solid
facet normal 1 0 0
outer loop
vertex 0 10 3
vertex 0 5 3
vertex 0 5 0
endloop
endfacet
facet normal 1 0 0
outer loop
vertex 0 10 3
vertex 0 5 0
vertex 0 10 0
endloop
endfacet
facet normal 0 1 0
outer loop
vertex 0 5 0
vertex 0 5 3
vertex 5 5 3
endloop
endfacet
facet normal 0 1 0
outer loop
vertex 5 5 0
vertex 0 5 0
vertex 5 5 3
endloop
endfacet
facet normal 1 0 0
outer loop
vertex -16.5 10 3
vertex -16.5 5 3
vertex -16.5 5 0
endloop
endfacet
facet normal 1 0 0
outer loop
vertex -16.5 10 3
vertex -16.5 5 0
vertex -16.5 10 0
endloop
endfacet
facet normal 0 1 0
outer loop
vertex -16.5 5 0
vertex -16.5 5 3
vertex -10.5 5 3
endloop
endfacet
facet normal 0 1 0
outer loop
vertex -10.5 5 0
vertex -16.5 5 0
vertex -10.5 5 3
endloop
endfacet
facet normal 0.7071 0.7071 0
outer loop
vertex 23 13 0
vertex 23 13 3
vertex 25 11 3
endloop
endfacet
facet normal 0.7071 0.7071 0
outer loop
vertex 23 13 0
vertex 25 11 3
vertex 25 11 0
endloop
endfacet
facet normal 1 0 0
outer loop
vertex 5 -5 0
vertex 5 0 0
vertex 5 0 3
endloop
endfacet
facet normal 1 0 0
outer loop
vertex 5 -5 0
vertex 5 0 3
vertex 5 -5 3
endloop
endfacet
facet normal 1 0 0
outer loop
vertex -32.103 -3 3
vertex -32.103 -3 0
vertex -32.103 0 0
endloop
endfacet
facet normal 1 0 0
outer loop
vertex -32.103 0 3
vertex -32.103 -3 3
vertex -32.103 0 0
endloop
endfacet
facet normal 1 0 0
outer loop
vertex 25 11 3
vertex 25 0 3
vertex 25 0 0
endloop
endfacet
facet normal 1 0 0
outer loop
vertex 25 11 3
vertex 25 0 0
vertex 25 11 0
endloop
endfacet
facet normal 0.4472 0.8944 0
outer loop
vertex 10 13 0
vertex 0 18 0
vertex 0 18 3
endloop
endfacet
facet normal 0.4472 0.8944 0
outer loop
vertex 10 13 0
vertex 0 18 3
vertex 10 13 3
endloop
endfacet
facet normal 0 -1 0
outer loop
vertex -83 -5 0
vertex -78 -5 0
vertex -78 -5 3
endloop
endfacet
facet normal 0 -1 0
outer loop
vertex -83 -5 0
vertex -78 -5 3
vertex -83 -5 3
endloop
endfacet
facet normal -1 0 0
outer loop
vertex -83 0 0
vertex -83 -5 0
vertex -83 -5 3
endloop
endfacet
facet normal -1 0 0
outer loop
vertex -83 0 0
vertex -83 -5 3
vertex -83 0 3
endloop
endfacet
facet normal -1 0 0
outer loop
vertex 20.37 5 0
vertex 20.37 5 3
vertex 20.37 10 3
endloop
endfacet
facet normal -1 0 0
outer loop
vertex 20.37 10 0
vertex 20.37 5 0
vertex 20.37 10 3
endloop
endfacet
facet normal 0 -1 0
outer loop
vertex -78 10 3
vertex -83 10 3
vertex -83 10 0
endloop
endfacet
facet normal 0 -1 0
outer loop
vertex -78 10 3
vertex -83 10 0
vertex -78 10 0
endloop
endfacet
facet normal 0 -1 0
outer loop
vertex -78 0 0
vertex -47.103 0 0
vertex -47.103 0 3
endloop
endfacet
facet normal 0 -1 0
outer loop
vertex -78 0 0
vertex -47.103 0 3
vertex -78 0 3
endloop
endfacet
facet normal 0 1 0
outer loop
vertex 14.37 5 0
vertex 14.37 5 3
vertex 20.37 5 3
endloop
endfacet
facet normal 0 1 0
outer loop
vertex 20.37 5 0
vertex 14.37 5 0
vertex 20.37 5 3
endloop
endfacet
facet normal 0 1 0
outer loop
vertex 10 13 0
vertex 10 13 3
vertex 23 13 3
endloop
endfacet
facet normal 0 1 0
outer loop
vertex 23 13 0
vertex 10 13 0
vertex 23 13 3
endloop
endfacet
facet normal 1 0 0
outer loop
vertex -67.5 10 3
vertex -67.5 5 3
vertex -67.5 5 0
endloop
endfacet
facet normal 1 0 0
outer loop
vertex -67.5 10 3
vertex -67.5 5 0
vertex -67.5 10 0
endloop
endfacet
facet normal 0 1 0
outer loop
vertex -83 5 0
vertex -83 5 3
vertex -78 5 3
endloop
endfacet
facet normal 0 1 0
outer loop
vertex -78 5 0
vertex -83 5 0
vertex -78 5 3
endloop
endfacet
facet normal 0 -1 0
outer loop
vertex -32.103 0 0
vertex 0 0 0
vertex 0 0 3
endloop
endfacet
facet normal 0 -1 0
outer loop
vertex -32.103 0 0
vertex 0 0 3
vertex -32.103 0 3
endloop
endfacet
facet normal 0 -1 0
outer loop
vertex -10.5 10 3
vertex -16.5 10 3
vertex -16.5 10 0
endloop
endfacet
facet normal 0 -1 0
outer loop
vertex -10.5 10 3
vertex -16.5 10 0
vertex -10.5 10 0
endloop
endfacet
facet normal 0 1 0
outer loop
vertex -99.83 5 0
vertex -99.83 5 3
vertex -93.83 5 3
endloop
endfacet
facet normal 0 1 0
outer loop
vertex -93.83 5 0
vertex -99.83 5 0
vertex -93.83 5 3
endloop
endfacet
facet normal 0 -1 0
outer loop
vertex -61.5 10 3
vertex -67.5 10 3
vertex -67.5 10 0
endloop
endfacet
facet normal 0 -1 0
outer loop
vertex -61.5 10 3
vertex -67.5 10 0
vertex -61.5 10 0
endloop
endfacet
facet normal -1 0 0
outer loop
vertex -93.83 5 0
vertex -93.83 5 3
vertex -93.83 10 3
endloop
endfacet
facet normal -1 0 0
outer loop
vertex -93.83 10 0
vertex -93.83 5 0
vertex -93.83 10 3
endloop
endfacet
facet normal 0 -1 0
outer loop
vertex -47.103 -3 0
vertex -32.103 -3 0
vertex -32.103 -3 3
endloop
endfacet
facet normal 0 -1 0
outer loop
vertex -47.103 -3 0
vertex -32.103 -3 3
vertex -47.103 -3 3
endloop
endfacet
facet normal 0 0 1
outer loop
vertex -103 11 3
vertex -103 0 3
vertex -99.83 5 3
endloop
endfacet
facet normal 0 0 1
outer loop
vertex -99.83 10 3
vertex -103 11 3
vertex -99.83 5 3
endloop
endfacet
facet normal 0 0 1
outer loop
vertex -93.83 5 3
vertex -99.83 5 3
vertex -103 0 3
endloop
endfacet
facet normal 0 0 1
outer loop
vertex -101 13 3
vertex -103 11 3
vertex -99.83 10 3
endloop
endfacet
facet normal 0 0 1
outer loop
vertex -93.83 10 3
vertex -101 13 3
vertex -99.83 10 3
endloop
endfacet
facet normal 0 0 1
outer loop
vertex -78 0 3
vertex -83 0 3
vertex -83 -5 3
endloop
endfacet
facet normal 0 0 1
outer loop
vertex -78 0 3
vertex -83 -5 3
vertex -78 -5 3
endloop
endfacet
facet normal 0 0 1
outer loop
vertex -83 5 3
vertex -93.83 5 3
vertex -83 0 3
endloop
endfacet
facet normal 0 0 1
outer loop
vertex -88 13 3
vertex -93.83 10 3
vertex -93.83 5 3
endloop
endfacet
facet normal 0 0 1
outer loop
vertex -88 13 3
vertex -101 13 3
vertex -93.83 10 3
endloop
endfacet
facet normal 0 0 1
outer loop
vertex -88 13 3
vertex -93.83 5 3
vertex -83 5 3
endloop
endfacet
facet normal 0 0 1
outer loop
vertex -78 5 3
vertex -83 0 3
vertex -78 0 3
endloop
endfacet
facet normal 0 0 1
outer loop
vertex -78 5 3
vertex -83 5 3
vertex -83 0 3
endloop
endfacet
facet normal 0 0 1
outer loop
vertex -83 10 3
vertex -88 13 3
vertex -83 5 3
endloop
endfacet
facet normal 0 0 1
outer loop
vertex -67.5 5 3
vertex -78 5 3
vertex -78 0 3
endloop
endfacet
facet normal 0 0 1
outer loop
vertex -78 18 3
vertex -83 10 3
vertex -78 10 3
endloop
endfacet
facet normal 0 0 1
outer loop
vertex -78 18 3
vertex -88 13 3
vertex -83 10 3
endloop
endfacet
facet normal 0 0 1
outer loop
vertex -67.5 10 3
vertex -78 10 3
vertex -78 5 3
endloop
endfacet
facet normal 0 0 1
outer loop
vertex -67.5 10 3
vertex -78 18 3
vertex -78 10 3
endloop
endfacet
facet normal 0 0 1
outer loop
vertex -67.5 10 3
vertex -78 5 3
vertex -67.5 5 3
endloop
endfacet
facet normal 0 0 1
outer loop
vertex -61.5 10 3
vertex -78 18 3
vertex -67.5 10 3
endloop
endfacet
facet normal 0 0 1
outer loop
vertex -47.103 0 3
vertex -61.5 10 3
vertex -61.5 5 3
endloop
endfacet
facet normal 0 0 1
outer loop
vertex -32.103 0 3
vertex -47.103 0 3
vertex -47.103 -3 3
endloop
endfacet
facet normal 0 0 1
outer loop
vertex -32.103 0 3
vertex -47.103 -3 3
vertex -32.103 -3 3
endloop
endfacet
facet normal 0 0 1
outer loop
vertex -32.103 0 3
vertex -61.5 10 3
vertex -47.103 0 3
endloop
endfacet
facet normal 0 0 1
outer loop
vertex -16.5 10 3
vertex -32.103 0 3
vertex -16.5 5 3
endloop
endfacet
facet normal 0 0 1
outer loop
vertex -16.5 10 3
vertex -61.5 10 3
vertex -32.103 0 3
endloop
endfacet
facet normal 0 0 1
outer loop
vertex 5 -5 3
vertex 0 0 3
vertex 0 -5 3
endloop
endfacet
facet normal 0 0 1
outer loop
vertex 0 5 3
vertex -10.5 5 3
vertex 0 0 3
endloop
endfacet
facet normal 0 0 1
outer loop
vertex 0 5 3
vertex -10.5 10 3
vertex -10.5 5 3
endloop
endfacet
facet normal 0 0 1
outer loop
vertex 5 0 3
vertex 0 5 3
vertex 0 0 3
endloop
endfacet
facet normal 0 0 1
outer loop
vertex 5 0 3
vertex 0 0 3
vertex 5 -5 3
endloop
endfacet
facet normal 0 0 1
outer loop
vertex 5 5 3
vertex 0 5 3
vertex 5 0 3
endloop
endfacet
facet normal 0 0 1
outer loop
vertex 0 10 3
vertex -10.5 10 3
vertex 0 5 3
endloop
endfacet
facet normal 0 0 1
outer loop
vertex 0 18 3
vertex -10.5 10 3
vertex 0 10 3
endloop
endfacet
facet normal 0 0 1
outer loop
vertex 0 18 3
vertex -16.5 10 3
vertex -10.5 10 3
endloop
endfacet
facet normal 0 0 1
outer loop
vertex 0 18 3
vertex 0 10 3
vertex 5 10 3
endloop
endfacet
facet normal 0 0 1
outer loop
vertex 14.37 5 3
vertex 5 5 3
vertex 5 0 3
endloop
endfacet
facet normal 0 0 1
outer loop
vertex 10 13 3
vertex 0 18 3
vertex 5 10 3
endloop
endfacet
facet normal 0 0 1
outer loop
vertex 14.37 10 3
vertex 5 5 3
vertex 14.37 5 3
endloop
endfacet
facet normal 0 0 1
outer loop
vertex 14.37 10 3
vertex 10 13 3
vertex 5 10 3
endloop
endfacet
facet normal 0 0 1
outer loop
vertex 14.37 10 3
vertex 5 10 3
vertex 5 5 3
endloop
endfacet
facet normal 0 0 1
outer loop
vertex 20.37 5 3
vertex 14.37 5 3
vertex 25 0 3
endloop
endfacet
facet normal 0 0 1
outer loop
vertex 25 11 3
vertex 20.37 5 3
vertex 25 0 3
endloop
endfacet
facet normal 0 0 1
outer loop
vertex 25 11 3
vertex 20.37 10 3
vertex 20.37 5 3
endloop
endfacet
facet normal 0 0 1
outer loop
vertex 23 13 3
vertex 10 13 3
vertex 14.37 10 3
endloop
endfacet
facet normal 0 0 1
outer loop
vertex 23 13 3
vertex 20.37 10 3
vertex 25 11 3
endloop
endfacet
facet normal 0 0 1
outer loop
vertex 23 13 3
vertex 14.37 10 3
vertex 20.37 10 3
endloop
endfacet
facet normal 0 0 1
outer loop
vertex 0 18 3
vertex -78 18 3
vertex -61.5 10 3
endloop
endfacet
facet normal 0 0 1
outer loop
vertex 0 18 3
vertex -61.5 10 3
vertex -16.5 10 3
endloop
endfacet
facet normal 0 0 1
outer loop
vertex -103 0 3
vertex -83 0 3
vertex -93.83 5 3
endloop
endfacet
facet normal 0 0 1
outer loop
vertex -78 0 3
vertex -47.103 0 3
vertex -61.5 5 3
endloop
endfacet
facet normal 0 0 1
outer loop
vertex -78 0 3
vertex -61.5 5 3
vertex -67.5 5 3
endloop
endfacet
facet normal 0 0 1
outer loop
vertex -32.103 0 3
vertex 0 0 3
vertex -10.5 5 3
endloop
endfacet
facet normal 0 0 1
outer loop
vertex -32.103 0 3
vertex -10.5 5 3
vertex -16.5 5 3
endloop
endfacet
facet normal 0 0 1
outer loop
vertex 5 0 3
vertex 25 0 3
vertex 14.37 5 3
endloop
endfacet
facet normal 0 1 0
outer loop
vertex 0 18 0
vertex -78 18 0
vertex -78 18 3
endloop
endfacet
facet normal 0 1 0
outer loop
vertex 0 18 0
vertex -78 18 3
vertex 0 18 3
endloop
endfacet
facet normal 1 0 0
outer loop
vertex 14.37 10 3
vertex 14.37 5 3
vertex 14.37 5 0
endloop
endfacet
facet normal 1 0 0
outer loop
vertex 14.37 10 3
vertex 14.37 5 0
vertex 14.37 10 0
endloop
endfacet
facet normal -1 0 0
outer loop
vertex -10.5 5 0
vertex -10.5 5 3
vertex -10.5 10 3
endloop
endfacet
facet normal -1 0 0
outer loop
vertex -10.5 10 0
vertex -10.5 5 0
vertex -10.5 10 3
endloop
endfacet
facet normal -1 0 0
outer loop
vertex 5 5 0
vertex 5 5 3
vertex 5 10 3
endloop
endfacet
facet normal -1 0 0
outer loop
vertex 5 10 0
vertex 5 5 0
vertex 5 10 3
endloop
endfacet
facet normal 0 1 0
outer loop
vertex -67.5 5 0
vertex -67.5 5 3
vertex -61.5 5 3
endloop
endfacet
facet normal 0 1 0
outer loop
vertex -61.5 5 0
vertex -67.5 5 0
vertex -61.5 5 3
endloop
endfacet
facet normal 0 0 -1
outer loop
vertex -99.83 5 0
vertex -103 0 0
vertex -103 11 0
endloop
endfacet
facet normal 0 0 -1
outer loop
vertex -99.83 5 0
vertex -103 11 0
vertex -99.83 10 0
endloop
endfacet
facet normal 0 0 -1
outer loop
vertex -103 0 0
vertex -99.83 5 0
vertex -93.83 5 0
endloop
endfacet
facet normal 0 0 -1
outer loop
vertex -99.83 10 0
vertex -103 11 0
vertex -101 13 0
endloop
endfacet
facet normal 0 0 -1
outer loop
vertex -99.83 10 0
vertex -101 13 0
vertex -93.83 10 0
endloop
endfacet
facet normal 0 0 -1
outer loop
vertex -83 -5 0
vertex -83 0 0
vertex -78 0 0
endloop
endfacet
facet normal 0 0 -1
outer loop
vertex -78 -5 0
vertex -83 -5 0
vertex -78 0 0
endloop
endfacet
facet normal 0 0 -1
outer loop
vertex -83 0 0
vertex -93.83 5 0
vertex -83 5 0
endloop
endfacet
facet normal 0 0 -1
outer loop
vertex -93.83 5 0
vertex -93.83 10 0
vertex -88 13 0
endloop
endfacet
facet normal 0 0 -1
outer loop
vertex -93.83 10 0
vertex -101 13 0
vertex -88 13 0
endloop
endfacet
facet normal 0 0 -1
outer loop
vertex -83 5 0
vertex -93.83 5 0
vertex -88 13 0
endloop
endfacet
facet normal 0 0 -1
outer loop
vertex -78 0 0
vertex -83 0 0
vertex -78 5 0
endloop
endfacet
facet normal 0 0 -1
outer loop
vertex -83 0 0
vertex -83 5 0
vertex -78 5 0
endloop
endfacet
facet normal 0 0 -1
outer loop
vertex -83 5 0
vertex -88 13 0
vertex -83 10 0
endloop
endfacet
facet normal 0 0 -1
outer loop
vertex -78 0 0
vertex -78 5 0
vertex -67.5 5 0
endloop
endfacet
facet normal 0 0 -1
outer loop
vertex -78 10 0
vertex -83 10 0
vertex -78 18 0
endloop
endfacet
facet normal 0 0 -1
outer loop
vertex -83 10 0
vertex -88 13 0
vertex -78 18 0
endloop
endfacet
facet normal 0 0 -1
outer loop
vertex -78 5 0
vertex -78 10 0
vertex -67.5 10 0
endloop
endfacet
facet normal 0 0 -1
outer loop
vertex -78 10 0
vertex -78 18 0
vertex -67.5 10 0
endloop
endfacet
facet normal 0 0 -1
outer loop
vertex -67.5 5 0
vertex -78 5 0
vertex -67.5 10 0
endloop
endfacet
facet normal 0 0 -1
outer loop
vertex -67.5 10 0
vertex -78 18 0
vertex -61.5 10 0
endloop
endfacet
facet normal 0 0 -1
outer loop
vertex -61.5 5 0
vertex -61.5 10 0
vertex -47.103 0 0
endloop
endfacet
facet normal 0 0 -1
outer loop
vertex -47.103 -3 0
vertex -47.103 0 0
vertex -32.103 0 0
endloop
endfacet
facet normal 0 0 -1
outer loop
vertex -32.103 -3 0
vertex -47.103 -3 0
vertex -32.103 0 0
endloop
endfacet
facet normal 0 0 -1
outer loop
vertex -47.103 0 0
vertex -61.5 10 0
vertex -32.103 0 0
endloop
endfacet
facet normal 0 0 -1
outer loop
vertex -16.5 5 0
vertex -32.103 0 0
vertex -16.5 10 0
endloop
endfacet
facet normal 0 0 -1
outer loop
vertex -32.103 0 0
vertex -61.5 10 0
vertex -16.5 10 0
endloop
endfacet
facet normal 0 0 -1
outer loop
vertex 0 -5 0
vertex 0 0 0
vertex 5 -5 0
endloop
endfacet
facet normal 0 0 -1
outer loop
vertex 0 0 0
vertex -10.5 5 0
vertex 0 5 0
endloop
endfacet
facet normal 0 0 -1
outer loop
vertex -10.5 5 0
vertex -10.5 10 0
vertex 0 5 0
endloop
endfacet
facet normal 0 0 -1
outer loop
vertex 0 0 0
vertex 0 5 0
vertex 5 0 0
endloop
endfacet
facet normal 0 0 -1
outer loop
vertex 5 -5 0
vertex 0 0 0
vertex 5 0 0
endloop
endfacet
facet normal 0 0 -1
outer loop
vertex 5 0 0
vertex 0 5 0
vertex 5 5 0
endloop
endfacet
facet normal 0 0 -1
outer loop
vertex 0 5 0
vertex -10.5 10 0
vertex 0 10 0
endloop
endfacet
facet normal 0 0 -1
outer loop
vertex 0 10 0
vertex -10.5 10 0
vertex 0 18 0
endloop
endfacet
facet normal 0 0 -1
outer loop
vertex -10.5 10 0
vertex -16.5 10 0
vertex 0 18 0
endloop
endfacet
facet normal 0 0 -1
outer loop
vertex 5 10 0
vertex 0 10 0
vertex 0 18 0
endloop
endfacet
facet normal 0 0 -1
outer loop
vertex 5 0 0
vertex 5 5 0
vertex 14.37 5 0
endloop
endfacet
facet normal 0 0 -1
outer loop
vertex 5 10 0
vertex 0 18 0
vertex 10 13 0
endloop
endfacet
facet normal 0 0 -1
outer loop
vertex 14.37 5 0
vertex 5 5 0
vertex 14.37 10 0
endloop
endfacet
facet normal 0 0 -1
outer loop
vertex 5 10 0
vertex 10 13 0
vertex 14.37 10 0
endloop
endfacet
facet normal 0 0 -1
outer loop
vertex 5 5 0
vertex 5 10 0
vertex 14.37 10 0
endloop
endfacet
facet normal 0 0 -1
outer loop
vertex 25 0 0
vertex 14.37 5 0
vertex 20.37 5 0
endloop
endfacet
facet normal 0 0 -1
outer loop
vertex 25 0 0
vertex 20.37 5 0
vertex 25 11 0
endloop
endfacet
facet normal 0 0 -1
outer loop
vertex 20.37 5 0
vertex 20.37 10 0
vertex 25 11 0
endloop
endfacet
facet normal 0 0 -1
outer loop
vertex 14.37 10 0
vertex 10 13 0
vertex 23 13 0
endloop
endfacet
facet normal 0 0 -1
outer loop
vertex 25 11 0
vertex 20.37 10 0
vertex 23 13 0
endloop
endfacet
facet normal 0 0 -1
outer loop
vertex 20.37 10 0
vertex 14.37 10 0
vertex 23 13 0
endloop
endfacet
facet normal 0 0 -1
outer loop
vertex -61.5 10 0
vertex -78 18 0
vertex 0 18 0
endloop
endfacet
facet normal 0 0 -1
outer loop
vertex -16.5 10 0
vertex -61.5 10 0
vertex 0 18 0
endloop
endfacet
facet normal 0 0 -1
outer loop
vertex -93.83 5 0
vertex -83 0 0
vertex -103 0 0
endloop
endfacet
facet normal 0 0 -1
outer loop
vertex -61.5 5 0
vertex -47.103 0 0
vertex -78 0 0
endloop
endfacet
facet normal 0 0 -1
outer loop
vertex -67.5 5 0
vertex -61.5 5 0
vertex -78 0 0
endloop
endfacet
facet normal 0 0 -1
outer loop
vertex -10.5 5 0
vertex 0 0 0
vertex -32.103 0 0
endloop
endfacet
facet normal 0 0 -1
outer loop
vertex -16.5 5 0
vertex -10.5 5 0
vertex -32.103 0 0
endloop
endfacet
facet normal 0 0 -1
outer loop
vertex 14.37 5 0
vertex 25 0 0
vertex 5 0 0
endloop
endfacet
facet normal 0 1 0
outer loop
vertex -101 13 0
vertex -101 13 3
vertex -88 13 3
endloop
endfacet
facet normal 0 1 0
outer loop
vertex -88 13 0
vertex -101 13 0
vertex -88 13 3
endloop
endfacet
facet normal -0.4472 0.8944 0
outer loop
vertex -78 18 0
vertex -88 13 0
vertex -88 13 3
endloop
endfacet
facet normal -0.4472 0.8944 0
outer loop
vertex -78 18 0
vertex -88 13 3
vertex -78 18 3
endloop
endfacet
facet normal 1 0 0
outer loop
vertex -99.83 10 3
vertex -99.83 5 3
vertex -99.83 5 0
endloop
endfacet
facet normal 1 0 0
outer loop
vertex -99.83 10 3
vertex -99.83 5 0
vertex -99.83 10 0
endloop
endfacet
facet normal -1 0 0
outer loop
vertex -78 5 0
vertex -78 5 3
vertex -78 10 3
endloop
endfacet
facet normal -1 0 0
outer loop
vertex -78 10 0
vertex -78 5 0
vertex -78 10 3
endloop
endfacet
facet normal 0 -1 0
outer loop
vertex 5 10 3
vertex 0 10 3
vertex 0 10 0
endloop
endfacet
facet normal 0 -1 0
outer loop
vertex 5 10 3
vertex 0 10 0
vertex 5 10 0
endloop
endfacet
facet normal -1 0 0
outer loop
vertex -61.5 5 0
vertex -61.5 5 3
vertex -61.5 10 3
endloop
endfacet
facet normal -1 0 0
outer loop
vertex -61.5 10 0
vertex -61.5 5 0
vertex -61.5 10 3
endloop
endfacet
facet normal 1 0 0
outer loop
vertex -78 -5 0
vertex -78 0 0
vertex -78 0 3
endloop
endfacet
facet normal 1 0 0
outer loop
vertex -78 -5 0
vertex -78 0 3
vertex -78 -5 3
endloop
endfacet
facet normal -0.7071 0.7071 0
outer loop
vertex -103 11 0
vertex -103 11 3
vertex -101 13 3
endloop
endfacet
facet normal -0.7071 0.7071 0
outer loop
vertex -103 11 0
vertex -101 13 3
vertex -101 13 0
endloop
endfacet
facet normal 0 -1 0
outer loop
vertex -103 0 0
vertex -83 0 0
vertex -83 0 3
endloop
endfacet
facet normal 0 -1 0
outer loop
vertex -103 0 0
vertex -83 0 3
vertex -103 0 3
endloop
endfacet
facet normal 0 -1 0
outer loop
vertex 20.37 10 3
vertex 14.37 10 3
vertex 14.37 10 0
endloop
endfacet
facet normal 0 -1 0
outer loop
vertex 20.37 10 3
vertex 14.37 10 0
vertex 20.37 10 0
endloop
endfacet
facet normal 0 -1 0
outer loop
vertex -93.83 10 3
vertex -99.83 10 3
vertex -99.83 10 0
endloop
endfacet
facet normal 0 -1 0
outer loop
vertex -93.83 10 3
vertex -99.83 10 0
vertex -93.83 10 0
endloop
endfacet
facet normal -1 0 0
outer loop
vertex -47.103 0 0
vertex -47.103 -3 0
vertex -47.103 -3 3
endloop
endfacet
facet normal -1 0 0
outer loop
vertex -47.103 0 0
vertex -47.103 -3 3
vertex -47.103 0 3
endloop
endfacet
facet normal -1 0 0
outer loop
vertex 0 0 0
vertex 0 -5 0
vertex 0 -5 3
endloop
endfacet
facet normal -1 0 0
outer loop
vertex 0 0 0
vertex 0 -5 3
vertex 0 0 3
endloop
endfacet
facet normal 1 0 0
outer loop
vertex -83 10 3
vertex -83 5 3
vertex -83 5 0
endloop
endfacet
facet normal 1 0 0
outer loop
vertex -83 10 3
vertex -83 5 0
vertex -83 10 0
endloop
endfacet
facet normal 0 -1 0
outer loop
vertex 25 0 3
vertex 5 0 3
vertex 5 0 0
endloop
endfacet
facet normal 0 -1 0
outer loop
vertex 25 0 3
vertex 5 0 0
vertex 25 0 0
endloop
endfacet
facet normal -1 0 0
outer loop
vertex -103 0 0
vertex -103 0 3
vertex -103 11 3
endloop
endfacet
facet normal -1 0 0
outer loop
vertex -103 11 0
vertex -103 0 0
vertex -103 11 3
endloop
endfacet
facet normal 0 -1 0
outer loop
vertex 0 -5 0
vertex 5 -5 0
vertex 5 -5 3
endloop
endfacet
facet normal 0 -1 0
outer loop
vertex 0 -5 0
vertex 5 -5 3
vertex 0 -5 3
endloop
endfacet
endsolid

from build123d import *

# Parameters (mm, degrees)
BOSS_EXTRUDE1_DEPTH = 3
SKETCH3_W           = 15
SKETCH3_H           = 13
BOSS_EXTRUDE2_DEPTH = 3
SKETCH2_W           = 6
SKETCH2_H           = 5
SKETCH2_W_2         = 5
CUT_EXTRUDE1_DEPTH  = 3
CHAMFER1_SIZE       = 2
SKETCH4_W           = 15
SKETCH4_H           = 3
BOSS_EXTRUDE3_DEPTH = 3


with BuildPart() as part:
    # Sketch1 → Boss-Extrude1 (new body)
    with BuildSketch(Plane.XY):
        Polygon((0, 0), (-78, 0), (-78, -5), (-83, -5), (-83, 0), (-88, 0), (-88, 13), (-78, 18), (0, 18), (10, 13), (10, 0), (5, 0), (5, -5), (0, -5), align=None)
    extrude(amount=BOSS_EXTRUDE1_DEPTH)

    # Sketch3 → Boss-Extrude2 (add)
    with BuildSketch(Plane.XY.offset(3)):
        with Locations((17.5, 6.5)):
            Rectangle(SKETCH3_W, SKETCH3_H)
        with Locations((-95.5, 6.5)):
            Rectangle(SKETCH3_W, SKETCH3_H)
    extrude(amount=-BOSS_EXTRUDE2_DEPTH)

    # Sketch2 → Cut-Extrude1 (cut)
    with BuildSketch(Plane.XY.offset(3)):
        with Locations((-64.5, 7.5)):
            Rectangle(SKETCH2_W, SKETCH2_H)
        with Locations((-13.5, 7.5)):
            Rectangle(SKETCH2_W, SKETCH2_H)
        with Locations((2.5, 7.5)):
            Rectangle(SKETCH2_W_2, SKETCH2_H)
        with Locations((-80.5, 7.5)):
            Rectangle(SKETCH2_W_2, SKETCH2_H)
        with Locations((17.37, 7.5)):
            Rectangle(SKETCH2_W, SKETCH2_H)
        with Locations((-96.83, 7.5)):
            Rectangle(SKETCH2_W, SKETCH2_H)
    extrude(amount=-CUT_EXTRUDE1_DEPTH, mode=Mode.SUBTRACT)

    # Chamfer1
    chamfer1_edges = [part.edges().sort_by_distance(p)[0] for p in [
        (25, 13, 1.5),
        (-103, 13, 1.5),
    ]]
    chamfer(chamfer1_edges, length=CHAMFER1_SIZE)

    # Sketch4 → Boss-Extrude3 (add)
    with BuildSketch(Plane(origin=(0, 0, 0), x_dir=(-1, 0, 0), z_dir=(0, 0, -1))):
        with Locations((39.602582465, -1.5)):
            Rectangle(SKETCH4_W, SKETCH4_H)
    extrude(amount=-BOSS_EXTRUDE3_DEPTH)


solid = part.part
